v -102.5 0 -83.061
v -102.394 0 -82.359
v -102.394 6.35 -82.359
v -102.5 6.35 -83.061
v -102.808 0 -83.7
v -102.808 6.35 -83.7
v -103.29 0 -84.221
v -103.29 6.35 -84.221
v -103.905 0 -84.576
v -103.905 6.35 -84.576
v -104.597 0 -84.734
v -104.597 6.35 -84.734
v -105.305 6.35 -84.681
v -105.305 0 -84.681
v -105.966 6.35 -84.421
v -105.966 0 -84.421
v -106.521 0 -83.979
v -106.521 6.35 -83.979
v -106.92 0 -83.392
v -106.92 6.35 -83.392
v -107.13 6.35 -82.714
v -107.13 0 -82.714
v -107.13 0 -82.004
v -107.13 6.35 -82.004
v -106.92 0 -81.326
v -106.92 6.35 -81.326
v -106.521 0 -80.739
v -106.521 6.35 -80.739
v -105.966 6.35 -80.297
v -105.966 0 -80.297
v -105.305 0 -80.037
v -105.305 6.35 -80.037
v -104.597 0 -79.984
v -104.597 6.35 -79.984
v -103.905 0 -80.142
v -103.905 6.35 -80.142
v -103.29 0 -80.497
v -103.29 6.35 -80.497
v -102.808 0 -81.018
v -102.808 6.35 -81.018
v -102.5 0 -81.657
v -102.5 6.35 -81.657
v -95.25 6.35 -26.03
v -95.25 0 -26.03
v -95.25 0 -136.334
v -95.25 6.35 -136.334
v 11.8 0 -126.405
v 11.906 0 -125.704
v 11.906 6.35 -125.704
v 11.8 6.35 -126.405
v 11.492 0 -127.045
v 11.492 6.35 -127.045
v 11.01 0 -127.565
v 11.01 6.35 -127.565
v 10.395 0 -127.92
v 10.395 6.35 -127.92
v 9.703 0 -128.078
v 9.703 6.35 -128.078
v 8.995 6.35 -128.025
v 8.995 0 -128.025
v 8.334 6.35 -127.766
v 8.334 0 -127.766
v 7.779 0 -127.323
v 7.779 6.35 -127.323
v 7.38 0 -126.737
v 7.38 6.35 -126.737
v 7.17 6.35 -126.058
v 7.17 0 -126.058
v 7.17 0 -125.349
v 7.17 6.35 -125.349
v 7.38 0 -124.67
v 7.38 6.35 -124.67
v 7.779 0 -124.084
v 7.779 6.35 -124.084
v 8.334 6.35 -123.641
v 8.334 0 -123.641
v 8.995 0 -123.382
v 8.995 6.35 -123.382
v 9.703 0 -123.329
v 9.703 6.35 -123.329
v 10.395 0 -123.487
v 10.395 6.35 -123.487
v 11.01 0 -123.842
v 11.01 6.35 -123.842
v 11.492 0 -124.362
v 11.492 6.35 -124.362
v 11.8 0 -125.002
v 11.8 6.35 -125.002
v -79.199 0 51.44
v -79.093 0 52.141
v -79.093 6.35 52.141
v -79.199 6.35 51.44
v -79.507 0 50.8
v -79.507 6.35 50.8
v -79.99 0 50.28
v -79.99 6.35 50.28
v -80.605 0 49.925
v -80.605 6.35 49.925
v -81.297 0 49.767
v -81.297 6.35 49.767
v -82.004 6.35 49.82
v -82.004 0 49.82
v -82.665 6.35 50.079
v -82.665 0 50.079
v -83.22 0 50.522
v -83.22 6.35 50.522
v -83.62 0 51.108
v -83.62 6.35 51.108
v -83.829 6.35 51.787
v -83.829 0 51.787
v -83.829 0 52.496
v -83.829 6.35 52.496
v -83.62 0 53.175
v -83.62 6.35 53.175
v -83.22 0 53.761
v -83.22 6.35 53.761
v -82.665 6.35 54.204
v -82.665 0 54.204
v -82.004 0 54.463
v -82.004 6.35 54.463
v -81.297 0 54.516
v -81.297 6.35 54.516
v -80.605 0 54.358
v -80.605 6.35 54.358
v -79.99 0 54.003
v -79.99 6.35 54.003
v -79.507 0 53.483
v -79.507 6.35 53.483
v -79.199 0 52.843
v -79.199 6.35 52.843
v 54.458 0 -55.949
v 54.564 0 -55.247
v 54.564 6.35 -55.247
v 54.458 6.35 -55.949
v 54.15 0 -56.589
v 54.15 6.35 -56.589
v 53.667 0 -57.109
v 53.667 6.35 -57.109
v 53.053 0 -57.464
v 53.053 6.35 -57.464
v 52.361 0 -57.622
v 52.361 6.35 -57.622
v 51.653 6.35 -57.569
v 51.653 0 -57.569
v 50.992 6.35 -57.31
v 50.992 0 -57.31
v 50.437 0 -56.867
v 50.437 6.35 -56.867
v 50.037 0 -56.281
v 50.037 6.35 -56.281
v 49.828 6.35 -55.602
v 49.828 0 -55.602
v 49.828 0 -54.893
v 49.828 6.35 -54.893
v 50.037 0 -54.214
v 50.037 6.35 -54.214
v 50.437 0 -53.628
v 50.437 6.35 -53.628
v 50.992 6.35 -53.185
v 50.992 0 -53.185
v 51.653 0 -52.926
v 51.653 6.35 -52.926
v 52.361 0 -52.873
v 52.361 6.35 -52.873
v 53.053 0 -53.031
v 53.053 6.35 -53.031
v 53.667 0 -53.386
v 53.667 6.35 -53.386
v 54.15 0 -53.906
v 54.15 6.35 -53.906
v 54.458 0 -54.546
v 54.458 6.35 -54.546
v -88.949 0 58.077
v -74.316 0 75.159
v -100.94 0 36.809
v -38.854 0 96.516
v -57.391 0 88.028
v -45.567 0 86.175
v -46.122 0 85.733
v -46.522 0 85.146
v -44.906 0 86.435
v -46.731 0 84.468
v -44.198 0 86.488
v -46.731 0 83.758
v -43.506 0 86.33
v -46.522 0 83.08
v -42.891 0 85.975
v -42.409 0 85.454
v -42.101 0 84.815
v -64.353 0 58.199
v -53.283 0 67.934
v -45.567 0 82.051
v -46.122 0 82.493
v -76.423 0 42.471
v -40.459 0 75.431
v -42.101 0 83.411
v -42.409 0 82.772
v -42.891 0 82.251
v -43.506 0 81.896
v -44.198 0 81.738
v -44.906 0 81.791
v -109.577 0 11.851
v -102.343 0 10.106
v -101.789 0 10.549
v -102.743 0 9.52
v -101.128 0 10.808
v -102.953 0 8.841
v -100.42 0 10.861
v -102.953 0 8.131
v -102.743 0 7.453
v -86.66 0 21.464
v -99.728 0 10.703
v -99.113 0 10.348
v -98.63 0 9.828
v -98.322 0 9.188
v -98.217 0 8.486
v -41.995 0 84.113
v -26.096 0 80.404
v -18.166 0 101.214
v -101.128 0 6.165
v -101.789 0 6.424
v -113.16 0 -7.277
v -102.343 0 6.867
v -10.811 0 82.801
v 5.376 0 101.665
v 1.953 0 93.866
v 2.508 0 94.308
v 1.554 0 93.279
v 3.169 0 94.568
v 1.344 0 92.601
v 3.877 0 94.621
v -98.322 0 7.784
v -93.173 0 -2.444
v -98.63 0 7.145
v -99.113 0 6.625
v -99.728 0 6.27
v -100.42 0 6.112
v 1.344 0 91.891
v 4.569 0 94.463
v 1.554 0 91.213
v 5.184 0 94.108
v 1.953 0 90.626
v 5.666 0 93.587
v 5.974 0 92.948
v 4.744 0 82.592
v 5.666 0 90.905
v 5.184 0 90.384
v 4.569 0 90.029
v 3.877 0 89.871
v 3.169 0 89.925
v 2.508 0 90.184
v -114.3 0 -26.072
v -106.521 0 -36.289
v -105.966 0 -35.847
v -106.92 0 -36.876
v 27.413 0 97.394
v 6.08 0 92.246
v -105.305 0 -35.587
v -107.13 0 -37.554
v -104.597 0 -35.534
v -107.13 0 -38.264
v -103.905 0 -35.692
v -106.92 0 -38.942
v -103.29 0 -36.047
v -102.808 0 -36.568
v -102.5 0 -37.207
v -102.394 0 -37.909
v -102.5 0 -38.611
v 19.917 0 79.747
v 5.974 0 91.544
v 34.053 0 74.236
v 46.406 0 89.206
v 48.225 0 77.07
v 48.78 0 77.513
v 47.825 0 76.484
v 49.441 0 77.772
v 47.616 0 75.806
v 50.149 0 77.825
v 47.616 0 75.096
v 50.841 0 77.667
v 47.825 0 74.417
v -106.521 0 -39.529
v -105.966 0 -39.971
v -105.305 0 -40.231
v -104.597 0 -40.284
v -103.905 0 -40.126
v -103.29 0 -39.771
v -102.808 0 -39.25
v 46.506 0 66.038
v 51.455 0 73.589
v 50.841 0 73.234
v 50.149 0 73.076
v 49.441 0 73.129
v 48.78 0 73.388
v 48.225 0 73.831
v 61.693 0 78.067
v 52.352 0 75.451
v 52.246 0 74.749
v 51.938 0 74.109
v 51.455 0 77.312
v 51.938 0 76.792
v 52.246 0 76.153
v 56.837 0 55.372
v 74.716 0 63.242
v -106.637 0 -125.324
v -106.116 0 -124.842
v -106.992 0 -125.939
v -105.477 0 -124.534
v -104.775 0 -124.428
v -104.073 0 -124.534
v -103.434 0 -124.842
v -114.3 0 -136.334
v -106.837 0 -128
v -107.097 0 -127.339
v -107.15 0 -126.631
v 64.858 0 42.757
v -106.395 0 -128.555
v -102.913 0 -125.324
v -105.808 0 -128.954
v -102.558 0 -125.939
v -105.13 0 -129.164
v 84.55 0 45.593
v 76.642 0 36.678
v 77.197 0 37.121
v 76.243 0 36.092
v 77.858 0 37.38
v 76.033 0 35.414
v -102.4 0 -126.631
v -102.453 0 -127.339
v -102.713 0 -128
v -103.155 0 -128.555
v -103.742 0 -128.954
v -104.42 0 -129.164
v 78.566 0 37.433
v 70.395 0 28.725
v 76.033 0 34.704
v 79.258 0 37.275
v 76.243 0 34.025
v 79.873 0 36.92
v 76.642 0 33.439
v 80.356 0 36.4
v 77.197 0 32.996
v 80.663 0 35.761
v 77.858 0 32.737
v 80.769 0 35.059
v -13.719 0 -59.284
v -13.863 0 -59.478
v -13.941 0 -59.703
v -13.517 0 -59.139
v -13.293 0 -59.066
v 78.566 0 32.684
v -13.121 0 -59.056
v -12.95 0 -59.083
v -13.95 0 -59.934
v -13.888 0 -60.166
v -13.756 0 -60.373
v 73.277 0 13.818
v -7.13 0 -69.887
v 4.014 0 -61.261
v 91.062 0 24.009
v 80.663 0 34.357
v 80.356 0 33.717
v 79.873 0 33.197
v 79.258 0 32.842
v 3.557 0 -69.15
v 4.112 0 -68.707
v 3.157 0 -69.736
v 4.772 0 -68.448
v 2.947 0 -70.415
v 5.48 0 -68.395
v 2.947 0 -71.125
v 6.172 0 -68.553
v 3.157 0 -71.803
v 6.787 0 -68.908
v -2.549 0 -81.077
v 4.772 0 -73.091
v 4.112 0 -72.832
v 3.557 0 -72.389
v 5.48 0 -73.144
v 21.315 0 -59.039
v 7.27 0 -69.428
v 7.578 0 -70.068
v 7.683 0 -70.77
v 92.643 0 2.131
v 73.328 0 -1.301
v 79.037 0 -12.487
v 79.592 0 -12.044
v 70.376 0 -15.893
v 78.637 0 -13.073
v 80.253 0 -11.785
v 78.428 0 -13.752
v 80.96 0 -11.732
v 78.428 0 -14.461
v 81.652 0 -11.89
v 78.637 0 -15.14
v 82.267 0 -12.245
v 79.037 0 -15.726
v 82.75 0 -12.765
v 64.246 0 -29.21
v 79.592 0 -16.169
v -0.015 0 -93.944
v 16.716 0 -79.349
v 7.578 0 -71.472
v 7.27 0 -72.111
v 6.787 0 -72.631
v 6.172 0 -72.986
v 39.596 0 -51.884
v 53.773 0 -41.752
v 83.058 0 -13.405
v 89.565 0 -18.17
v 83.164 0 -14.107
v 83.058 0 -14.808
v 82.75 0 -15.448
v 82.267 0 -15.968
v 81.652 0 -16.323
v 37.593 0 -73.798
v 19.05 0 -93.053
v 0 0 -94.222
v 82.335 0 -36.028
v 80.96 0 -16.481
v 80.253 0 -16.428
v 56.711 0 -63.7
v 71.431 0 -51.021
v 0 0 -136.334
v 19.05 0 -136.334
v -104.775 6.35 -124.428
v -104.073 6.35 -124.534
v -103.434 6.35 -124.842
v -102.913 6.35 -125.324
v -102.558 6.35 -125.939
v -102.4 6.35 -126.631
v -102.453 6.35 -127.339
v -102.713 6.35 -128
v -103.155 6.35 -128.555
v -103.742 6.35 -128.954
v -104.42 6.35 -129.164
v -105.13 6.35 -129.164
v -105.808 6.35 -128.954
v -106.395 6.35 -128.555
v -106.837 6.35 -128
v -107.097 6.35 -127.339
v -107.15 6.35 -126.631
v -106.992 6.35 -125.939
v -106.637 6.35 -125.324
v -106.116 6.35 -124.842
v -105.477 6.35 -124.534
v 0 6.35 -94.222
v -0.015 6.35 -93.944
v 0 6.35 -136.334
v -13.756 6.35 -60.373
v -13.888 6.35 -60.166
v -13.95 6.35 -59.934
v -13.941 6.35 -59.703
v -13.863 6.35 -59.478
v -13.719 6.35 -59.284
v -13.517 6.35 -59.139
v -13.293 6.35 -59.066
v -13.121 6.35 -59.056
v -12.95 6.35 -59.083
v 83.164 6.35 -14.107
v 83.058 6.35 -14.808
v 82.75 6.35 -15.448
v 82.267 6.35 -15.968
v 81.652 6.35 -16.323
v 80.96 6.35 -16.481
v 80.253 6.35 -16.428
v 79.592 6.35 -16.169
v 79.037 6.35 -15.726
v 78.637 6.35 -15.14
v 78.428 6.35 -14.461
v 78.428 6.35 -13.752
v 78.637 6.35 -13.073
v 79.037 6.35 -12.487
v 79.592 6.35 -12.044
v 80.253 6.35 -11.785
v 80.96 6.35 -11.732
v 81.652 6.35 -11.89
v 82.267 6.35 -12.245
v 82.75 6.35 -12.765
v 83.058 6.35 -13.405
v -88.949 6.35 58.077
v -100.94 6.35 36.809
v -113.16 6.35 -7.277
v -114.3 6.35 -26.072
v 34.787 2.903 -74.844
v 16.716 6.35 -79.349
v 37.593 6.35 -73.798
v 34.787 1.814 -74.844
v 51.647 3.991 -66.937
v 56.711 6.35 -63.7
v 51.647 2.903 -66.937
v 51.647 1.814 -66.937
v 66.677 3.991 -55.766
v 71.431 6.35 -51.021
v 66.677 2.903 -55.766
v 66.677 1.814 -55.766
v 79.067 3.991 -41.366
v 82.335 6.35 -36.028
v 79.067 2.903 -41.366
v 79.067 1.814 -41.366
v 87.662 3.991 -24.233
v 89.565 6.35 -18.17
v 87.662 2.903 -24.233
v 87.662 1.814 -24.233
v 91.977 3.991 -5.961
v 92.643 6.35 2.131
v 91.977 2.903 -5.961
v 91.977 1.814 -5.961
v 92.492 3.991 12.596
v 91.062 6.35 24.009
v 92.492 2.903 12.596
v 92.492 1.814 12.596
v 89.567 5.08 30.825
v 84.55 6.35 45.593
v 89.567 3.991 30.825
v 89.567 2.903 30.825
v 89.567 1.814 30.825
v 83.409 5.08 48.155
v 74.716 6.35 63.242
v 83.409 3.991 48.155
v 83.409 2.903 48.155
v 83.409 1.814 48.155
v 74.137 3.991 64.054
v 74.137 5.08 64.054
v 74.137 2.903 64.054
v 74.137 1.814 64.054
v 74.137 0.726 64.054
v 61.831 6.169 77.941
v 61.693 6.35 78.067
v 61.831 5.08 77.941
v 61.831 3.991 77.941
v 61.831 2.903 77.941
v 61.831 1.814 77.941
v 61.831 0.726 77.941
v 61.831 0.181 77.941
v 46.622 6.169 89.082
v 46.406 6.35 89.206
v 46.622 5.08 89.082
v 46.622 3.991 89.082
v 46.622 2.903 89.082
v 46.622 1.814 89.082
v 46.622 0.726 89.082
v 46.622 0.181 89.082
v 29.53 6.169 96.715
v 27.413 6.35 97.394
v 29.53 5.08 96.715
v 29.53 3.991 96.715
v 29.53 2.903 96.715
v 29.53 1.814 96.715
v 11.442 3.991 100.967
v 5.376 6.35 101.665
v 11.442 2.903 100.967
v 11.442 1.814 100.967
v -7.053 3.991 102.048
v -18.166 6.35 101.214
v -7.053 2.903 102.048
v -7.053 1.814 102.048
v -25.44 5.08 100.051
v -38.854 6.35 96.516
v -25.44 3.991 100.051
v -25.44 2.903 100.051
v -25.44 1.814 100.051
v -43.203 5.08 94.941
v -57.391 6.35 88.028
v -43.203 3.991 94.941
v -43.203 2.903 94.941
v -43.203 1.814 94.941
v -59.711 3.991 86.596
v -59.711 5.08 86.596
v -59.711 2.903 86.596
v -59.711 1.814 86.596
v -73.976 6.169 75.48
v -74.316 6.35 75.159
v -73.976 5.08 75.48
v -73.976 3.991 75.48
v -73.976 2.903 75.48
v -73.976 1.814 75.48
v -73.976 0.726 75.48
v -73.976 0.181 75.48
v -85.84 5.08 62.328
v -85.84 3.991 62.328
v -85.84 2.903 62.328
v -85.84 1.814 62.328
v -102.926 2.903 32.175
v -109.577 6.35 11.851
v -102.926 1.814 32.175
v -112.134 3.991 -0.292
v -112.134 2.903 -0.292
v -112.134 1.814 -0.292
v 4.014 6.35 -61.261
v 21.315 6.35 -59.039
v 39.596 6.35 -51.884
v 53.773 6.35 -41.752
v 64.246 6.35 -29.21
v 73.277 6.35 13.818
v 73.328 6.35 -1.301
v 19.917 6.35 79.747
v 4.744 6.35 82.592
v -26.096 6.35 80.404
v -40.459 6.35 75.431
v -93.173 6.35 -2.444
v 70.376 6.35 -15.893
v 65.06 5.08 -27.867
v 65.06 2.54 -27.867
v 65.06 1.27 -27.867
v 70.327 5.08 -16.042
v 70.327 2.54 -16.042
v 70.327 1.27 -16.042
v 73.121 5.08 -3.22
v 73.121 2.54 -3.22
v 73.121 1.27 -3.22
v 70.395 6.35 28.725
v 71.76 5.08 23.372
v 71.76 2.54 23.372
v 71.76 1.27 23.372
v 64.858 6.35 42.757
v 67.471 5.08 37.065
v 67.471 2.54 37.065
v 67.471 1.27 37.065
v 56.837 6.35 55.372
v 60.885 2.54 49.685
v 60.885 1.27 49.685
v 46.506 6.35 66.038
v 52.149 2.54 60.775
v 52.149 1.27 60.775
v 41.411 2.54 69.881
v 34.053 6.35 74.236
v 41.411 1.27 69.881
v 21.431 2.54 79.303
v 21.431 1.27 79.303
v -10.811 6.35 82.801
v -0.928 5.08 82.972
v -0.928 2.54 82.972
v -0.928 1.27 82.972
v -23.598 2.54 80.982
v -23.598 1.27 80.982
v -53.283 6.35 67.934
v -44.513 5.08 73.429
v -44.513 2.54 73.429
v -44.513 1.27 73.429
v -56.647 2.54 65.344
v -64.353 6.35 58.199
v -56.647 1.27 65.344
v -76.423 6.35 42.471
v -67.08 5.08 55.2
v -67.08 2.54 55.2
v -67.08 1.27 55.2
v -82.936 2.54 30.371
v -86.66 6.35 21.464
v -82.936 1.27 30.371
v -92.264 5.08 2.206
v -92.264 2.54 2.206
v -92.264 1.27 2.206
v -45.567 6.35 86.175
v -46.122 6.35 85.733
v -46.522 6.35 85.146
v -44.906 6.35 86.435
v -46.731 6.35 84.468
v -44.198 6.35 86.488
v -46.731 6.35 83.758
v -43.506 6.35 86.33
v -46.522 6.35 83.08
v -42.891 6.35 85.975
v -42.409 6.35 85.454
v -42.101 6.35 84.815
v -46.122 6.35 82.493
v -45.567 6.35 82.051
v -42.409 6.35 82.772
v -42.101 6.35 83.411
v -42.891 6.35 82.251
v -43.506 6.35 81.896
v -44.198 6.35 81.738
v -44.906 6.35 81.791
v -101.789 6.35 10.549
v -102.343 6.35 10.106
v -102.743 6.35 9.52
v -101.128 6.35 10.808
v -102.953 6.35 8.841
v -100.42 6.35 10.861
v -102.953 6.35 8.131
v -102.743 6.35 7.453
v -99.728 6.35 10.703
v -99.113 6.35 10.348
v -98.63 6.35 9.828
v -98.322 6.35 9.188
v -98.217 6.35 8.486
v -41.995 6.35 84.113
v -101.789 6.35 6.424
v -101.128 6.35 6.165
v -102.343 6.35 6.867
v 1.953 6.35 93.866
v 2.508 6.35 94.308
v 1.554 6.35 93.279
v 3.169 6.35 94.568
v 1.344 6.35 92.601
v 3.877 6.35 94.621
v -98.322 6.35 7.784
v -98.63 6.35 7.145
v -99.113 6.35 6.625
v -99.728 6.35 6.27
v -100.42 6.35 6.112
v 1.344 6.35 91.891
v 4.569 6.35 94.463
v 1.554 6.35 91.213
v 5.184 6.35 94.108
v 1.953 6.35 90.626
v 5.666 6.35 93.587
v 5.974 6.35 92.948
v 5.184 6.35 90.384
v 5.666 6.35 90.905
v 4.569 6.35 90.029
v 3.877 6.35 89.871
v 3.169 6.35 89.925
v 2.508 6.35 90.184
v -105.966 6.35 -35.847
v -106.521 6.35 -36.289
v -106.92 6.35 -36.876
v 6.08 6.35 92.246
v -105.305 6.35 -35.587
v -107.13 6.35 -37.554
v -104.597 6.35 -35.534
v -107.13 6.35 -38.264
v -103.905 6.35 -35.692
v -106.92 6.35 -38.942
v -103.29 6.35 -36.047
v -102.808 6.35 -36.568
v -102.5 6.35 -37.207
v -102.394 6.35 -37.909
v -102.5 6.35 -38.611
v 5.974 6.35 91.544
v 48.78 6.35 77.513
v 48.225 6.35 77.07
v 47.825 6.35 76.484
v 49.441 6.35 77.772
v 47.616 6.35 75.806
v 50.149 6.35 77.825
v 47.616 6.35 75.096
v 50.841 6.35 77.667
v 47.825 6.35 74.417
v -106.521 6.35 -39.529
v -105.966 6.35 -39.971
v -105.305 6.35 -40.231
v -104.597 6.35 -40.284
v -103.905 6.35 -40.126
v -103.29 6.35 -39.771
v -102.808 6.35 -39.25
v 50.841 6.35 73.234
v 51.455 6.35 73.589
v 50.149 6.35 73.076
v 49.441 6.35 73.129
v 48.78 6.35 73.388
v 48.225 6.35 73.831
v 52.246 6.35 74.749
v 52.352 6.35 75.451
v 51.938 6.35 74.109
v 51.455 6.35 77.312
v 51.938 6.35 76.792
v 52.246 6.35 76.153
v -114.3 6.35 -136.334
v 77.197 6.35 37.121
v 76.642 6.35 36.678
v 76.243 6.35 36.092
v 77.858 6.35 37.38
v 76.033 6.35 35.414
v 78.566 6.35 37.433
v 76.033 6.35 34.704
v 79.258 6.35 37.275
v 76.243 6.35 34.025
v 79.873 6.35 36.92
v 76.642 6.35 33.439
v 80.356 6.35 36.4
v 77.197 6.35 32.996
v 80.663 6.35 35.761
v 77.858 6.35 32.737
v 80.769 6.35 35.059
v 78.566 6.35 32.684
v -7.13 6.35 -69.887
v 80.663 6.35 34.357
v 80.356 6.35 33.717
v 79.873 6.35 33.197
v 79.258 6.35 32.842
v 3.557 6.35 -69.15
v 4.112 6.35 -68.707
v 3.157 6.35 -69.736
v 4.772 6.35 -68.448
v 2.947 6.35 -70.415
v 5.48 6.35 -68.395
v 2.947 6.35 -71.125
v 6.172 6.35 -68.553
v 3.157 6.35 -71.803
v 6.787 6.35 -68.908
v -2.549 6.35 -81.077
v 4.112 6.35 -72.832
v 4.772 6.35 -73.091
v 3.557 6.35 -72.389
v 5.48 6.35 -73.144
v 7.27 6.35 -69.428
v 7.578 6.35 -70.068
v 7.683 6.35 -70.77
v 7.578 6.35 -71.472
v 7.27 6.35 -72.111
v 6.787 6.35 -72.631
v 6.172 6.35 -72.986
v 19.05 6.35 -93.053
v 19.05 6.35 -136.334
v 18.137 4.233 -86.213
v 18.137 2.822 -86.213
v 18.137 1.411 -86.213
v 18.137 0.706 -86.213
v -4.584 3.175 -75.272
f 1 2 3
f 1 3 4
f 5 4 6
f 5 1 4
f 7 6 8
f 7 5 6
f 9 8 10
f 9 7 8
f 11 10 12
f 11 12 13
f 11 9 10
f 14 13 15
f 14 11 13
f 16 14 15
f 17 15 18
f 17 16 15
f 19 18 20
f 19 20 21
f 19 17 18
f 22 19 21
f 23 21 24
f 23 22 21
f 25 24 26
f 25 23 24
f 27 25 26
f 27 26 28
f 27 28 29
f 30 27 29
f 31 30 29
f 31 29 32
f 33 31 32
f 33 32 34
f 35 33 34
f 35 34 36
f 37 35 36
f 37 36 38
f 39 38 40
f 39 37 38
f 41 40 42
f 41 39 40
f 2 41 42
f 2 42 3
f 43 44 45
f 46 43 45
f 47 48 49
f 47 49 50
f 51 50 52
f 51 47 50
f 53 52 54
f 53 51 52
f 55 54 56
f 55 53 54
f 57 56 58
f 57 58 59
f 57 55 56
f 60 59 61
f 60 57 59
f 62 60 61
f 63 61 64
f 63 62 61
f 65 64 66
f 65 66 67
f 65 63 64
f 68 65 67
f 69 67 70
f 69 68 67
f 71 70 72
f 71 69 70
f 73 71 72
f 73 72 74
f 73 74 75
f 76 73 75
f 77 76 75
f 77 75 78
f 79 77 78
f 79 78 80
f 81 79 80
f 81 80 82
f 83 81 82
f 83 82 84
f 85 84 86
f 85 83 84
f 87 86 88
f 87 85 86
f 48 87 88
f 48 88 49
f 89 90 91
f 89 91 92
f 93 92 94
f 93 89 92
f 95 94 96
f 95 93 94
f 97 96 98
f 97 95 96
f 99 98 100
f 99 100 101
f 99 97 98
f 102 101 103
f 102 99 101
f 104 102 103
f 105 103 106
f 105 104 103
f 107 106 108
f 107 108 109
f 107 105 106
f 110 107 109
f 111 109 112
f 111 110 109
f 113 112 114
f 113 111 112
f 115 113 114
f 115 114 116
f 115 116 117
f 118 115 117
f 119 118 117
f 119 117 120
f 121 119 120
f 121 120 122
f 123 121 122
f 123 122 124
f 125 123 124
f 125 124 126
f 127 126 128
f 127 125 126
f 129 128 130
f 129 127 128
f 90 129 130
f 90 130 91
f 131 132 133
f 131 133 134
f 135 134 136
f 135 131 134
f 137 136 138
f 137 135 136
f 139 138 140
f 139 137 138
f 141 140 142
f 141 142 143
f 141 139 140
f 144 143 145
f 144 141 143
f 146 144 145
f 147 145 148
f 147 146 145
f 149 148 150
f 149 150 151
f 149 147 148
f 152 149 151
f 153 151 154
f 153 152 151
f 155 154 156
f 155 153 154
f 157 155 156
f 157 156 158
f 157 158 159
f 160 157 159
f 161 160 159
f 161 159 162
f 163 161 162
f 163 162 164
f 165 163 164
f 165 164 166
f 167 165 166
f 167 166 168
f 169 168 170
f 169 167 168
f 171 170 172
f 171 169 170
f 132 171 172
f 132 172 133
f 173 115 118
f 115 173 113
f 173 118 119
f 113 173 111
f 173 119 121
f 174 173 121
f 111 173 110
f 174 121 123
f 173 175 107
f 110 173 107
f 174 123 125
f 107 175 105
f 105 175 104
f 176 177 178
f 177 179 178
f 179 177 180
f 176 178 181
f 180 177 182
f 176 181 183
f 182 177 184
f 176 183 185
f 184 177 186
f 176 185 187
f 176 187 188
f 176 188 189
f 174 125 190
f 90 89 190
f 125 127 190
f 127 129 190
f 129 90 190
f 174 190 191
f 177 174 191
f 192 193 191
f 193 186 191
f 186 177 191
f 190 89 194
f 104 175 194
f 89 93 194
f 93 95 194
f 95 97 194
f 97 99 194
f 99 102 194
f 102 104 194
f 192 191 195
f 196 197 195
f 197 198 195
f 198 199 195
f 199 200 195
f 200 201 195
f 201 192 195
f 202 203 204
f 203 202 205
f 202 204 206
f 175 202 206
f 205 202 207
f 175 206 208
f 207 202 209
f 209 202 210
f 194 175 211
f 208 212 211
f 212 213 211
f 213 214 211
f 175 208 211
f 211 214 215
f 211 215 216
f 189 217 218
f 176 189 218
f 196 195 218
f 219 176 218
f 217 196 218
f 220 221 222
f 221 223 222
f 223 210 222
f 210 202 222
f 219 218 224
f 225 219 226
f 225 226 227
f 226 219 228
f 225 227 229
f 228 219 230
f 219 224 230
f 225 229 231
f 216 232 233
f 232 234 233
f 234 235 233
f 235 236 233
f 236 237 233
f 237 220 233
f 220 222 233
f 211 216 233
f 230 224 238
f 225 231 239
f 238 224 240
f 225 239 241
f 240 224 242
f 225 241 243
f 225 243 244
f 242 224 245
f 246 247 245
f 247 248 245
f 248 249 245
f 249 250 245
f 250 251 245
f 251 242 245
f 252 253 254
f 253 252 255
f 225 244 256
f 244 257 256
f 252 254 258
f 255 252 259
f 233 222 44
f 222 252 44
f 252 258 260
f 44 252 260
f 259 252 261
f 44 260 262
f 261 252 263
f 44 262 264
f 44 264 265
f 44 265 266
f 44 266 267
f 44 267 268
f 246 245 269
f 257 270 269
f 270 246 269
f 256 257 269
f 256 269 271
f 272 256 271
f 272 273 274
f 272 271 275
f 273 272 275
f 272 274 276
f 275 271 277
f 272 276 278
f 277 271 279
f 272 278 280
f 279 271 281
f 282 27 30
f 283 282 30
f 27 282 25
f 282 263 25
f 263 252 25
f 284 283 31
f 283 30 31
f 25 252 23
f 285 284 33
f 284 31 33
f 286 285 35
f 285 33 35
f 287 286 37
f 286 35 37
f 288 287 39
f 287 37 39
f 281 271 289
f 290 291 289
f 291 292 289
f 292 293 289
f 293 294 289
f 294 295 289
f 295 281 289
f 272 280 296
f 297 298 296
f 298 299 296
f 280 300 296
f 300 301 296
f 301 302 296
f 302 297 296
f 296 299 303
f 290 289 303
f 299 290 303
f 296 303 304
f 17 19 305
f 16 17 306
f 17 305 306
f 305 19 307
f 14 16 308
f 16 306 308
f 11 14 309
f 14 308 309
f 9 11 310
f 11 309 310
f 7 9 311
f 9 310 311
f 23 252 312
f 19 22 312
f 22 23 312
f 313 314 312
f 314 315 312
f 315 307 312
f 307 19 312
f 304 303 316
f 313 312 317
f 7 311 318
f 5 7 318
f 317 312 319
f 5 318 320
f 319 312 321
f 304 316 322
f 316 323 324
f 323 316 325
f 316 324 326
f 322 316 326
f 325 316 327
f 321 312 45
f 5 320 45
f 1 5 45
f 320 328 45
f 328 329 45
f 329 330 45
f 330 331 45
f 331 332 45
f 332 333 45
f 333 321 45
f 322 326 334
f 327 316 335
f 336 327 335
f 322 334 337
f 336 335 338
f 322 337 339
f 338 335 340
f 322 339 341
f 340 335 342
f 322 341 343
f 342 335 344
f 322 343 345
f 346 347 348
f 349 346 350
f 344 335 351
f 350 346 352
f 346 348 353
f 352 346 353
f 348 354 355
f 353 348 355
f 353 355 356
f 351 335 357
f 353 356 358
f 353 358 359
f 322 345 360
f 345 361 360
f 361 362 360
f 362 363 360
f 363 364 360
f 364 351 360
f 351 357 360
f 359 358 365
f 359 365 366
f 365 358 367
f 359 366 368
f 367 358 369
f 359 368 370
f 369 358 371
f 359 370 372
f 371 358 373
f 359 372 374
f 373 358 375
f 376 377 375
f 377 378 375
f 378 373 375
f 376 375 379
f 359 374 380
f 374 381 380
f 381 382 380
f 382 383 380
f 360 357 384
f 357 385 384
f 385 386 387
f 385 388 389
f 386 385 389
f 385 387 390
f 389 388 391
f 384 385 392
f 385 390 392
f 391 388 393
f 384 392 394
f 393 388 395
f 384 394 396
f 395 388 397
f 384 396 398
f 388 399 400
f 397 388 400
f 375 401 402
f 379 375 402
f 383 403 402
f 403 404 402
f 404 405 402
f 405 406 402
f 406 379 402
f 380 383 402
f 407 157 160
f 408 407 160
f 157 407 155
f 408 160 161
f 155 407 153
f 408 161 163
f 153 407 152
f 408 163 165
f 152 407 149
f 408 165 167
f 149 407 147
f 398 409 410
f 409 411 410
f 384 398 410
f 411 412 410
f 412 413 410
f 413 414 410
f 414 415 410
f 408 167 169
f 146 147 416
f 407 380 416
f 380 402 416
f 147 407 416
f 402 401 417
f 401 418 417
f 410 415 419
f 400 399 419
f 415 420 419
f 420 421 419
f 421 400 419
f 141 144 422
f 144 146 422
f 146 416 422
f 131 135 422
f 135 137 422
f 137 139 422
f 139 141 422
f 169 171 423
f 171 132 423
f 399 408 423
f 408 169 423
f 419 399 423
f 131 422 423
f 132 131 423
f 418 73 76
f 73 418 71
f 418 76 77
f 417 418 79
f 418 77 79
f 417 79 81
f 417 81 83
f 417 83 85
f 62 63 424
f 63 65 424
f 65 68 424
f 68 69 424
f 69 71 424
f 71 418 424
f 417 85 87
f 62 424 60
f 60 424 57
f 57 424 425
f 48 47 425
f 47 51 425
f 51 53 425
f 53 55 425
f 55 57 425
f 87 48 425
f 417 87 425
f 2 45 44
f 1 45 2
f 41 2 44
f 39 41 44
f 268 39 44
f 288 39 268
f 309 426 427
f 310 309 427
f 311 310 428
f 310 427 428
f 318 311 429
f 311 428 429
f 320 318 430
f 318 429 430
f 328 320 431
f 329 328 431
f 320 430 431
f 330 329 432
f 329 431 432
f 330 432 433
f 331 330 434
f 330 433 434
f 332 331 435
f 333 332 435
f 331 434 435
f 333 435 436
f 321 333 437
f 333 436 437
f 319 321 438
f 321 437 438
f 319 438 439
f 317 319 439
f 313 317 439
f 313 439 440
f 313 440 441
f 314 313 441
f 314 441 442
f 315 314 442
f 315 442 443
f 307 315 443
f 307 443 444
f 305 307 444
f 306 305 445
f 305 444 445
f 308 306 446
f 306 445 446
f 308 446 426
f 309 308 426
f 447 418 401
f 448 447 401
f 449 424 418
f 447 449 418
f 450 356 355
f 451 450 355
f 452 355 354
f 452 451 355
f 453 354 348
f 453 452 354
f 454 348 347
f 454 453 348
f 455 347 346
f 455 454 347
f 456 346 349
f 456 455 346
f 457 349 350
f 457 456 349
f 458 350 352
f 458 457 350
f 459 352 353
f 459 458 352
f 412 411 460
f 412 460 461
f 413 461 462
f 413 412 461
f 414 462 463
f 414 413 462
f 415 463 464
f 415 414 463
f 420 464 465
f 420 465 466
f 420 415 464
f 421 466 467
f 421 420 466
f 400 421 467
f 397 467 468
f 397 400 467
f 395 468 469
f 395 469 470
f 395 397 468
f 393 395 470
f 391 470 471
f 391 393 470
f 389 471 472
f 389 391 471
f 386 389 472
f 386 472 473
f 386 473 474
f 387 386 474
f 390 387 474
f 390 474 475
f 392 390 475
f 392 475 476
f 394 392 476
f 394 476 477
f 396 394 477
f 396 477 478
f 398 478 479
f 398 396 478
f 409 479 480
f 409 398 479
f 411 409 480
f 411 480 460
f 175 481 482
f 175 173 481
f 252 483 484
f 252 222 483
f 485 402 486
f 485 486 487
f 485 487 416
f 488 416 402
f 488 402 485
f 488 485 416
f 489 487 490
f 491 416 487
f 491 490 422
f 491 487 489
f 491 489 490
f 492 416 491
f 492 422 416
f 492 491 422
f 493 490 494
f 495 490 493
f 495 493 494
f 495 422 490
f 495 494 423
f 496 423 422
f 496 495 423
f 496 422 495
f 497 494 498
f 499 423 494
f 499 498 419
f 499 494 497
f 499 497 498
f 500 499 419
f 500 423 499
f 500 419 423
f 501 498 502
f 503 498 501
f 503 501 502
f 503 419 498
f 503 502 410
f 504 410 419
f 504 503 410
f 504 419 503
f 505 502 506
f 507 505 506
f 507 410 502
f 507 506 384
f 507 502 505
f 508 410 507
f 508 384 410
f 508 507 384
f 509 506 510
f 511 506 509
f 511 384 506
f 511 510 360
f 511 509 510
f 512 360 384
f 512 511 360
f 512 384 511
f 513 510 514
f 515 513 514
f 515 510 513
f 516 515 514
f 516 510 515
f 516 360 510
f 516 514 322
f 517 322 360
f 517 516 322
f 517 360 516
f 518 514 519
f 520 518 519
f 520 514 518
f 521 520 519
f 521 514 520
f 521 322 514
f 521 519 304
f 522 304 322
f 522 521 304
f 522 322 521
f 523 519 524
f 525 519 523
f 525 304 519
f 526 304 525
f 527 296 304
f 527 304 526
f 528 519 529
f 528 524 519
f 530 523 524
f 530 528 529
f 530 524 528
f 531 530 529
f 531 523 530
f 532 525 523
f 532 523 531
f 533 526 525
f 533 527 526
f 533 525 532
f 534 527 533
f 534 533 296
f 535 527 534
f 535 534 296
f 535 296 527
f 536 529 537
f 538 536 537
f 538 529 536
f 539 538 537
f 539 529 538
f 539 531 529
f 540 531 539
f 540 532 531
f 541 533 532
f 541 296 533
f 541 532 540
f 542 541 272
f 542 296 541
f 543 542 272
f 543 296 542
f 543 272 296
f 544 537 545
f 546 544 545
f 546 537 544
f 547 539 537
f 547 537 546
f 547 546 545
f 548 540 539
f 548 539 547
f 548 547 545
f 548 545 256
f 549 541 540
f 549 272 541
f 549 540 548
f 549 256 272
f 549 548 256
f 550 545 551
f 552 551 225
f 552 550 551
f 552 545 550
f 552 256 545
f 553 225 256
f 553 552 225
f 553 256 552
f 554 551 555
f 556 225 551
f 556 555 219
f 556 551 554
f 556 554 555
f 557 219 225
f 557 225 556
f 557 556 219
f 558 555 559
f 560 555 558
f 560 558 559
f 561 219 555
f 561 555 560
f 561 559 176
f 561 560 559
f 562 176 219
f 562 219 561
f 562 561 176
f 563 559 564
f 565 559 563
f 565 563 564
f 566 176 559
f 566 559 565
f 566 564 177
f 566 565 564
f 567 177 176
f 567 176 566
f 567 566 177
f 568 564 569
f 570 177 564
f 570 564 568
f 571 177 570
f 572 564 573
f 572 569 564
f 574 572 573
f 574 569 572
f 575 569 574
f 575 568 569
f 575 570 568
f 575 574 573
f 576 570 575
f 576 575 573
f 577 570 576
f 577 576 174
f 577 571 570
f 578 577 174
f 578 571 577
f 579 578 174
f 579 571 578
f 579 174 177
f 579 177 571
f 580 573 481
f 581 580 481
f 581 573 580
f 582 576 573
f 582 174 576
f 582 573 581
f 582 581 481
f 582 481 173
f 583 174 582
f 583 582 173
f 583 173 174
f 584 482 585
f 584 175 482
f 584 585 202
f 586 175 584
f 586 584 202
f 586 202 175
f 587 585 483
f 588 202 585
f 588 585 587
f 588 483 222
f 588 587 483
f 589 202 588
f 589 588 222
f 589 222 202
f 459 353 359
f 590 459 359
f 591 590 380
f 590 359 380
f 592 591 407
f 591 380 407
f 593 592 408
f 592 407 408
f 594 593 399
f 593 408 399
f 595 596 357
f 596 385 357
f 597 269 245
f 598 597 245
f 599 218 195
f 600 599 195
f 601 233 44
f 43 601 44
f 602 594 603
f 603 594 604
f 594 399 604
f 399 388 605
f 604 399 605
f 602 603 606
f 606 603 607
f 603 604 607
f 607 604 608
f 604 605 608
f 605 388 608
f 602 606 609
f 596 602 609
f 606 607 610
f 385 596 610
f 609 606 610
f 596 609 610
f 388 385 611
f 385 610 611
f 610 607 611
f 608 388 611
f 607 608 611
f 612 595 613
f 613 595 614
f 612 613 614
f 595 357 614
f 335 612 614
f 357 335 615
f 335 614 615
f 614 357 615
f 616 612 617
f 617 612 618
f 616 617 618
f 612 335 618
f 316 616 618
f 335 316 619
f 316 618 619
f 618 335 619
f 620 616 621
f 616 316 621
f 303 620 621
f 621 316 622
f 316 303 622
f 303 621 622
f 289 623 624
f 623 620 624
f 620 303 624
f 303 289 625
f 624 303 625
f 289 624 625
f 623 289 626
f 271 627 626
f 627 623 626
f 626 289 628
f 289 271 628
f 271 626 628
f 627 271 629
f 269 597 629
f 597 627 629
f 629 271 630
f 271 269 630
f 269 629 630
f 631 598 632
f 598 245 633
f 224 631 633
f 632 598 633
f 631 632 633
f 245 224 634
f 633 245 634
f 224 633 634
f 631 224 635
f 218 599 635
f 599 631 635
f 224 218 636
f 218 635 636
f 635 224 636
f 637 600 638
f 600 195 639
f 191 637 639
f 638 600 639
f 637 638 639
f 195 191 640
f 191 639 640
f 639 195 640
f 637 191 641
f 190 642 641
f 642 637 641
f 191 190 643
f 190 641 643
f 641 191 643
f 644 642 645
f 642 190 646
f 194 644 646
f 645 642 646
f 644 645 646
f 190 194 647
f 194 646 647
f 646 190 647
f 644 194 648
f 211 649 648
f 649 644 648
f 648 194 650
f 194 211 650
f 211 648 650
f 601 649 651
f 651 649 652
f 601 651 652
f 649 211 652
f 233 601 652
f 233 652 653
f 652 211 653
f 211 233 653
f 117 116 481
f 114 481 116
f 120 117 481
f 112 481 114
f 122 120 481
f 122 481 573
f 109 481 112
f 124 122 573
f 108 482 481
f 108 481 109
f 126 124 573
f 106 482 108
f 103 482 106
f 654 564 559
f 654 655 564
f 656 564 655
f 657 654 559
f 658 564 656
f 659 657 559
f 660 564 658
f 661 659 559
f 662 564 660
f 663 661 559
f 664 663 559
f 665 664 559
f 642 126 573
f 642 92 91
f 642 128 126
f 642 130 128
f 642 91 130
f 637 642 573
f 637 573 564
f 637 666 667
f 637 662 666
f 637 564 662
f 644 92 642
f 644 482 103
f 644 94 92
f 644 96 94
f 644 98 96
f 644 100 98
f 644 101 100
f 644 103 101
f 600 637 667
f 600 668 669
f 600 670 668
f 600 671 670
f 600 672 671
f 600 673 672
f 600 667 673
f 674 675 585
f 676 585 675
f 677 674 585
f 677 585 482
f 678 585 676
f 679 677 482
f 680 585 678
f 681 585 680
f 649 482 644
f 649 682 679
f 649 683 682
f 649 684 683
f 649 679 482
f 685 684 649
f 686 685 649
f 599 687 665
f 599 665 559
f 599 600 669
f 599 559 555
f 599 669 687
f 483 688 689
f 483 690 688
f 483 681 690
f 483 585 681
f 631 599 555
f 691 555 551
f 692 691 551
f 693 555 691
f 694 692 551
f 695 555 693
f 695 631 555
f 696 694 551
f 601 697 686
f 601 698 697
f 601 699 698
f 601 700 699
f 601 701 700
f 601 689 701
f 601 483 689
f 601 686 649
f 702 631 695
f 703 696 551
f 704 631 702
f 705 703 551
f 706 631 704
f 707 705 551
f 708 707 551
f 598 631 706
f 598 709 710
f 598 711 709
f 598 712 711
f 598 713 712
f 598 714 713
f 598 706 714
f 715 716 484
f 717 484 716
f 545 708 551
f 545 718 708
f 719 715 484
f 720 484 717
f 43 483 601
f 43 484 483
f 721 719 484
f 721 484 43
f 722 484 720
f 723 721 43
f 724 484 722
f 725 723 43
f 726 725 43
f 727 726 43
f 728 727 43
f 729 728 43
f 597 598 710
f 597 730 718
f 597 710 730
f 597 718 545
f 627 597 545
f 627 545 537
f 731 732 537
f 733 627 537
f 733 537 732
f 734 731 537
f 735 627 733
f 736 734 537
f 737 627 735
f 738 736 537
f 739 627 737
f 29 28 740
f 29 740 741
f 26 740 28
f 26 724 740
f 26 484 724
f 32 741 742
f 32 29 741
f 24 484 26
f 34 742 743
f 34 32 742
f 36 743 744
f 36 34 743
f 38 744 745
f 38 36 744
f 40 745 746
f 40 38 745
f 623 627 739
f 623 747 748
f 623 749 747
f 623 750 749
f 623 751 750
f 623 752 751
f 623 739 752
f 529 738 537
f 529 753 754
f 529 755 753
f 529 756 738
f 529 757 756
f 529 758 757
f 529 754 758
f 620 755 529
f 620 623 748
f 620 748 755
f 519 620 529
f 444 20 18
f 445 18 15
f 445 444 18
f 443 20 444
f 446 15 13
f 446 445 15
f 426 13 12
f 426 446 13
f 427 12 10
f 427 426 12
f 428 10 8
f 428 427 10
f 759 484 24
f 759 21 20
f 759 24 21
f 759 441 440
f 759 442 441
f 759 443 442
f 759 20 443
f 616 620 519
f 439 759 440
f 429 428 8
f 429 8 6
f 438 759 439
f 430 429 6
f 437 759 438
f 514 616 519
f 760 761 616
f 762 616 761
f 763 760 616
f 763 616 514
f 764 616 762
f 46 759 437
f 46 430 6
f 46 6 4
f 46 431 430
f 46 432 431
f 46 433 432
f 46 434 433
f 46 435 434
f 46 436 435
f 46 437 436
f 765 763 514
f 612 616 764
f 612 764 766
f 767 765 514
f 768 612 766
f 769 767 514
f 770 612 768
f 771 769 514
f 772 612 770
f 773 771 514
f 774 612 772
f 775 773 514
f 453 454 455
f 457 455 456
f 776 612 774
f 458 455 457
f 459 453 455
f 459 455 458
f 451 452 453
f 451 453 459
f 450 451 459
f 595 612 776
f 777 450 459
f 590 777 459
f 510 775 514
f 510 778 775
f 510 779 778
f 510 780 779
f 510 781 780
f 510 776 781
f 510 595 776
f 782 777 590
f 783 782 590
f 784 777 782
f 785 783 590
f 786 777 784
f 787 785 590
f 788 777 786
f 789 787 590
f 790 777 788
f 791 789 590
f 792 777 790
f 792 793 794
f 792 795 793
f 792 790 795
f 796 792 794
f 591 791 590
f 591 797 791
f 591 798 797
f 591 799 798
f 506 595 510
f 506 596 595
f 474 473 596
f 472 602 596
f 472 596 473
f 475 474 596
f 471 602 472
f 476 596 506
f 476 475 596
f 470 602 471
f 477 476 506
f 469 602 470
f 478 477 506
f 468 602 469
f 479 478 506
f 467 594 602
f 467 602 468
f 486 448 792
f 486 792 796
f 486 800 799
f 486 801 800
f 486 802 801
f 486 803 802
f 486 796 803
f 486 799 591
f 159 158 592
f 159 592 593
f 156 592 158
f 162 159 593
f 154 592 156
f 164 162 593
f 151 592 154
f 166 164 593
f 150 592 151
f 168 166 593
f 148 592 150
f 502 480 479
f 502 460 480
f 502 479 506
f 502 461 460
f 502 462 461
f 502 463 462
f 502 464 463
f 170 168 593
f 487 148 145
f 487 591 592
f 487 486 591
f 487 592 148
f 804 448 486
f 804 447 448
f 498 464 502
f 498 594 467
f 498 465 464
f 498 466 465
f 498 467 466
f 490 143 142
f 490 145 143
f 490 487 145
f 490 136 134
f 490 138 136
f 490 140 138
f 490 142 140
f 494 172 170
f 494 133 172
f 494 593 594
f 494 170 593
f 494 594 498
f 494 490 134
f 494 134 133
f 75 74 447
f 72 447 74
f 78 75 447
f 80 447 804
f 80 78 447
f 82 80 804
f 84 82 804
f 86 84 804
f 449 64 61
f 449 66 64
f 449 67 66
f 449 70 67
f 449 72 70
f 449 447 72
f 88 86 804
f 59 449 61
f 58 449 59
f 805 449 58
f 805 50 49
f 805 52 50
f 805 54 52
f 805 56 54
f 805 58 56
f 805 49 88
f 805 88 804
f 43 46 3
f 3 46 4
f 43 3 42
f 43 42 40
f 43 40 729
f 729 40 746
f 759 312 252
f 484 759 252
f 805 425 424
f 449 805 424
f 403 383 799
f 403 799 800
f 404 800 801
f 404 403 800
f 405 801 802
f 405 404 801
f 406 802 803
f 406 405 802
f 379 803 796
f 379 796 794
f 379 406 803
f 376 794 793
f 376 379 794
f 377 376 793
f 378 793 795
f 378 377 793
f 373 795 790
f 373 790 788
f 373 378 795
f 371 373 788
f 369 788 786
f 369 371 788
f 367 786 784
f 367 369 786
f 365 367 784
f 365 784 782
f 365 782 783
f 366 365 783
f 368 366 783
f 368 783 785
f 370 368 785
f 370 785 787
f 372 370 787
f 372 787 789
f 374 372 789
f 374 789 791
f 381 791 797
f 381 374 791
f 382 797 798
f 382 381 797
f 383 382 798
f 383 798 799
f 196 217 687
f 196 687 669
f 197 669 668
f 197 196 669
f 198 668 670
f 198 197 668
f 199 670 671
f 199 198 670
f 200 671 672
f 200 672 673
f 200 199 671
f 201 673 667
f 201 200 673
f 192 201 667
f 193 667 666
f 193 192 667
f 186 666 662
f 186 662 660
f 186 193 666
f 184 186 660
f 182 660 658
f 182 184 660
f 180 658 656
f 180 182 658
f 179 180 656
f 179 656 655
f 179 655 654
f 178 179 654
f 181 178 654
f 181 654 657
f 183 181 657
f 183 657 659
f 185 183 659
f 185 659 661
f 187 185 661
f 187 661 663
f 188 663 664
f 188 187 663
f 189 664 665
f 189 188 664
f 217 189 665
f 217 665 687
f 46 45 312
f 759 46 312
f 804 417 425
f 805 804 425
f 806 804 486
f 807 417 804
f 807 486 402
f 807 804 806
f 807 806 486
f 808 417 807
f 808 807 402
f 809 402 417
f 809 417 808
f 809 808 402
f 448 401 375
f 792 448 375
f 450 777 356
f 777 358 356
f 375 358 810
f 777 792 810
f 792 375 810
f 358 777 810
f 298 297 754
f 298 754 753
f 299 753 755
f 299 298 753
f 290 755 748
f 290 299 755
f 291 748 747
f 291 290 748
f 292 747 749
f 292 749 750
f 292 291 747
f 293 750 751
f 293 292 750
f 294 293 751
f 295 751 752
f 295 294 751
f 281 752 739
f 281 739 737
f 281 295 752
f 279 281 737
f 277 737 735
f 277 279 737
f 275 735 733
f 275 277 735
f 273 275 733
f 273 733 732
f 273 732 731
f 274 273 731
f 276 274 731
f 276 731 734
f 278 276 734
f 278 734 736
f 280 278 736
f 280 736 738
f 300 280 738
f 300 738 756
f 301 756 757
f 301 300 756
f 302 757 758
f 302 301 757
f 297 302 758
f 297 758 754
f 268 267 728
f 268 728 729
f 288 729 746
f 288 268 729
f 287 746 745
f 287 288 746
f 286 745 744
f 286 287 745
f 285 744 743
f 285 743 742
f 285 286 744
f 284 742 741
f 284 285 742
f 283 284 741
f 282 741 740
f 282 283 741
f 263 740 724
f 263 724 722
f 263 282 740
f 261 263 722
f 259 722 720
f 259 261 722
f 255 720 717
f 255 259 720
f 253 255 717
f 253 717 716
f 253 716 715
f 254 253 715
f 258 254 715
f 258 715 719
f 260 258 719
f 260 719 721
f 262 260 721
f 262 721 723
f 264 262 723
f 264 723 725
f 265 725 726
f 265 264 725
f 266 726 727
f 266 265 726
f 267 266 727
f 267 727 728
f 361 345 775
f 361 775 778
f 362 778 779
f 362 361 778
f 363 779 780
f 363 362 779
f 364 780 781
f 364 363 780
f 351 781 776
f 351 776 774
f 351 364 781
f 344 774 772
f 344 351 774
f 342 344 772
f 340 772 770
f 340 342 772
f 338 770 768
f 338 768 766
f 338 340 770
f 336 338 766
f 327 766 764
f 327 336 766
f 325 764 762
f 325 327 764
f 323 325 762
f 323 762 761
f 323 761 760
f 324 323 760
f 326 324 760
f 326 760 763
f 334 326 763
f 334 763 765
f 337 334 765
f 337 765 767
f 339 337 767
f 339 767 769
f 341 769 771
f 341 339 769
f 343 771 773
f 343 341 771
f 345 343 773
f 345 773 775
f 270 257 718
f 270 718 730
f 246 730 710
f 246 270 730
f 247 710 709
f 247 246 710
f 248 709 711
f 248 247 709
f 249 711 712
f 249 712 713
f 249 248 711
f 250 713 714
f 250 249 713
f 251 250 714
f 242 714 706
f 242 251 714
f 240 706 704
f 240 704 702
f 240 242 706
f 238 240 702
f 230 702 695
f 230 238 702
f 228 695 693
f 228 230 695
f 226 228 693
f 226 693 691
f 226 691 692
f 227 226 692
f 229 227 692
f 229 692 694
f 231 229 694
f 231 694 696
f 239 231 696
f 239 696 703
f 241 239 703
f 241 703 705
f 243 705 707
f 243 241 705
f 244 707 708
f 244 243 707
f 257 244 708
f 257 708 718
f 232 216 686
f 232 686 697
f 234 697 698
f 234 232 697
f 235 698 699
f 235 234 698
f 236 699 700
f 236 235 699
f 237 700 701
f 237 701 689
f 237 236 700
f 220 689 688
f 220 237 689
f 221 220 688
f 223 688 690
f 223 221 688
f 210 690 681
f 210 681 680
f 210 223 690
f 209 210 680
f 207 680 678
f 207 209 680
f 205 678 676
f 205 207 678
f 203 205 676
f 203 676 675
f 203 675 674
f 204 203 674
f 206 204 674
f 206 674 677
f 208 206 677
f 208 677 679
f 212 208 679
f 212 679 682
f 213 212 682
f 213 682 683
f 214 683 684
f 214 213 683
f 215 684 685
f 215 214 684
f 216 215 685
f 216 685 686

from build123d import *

# Parameters (mm, degrees)
BOSS_EXTRUDE1_DEPTH   = 6.35
FILLET1_R             = 2.54
FILLET2_R             = 0.79375
SKETCH4_R             = 2.38125
CUT_EXTRUDE3_DEPTH    = 6.35
CRVPATTERN1_OUTLINE_R = 2.38125
CRVPATTERN1_DEPTH     = 6.35


# Read off the part's stored shape, not the designer's step: CrvPattern1
with BuildPart() as part:
    # Sketch1 → Boss-Extrude1 (new body)
    with BuildSketch(Plane(origin=(0, 0, 0), x_dir=(1, 0, 0), z_dir=(0, 1, 0))):
        with BuildLine():
            Line((0, 136.334024978), (0, 94.083801247))
            add(Edge.make_bspline(
                [(0, 94.083801247), (-2.431386336, 71.693275709), (-15.75825593, 58.230430146)],
                knots=[0, 0, 0, 1, 1, 1], degree=2))
            add(Edge.make_bspline(
                [(-15.75825593, 58.230430146), (12.928997408, 67.764135595), (70.60122301, 46.247103047), (77.540383798, -26.213493844), (40.518788725, -85.775261158), (-67.055108572, -88.304279922), (-95.415707681, -10.214485927), (-95.25, 26.030170649)],
                knots=[0, 0, 0, 0, 0.227546357, 0.356849793, 0.49581236, 0.710996888, 1, 1, 1, 1], degree=3))
            Line((-95.25, 26.030170649), (-95.25, 136.334024978))
            Line((-95.25, 136.334024978), (-114.3, 136.334024978))
            Line((-114.3, 136.334024978), (-114.3, 26.072111228))
            add(Edge.make_bspline(
                [(16.715986391, 79.348568009), (21.633097871, 78.62719896), (31.371857261, 76.389721894), (45.249200497, 70.845276961), (58.14270202, 63.202354702), (69.694268499, 53.486594004), (77.831645881, 43.678743898), (83.1663553, 34.778326042), (87.500656656, 25.500338712), (91.157064432, 13.400044888), (92.998924079, -1.463666218), (92.533158628, -16.332160856), (89.911348046, -30.922868008), (85.224669703, -44.926534482), (78.5424766, -58.087321563), (69.892966554, -70.128088223), (59.334225085, -80.722518946), (46.808294676, -89.48437896), (33.165750854, -95.831204537), (18.8220758, -100.00043745), (4.083822861, -102.101602424), (-10.777441223, -102.219799961), (-25.504851136, -100.381408636), (-37.452741503, -97.197322494), (-46.66563909, -93.622653994), (-53.378233983, -90.404269128), (-59.778019163, -86.667831837), (-67.772964247, -81.11349497), (-76.794838317, -73.191996697), (-86.082507199, -62.480245978), (-96.526865188, -46.978935087), (-104.24741081, -30.151640125), (-109.53383183, -12.800694626), (-112.324631517, 0.306051107), (-113.698273493, 11.158780223), (-114.231429958, 19.740893087), (-114.308990648, 23.9549561), (-114.3, 26.072111228)],
                knots=[0.074418032, 0.074418032, 0.074418032, 0.074418032, 0.103339233, 0.132260434, 0.161181635, 0.190102836, 0.219024037, 0.233484638, 0.247945239, 0.27686644, 0.305787641, 0.334708842, 0.363630043, 0.392551244, 0.421472445, 0.450393647, 0.479314848, 0.508236049, 0.53715725, 0.566078451, 0.594999652, 0.623920853, 0.652842055, 0.681763256, 0.696223856, 0.710684457, 0.725145057, 0.739605658, 0.768526859, 0.79744806, 0.826369261, 0.884211664, 0.913132865, 0.942054066, 0.970975267, 0.985435868, 0.999896468, 0.999896468, 0.999896468, 0.999896468], degree=3))
            add(Edge.make_bspline(
                [(19.05, 93.052513121), (19.023571763, 92.809136693), (18.983692868, 92.443089224), (18.931467162, 91.958957236), (18.862360798, 91.337915751), (18.776292871, 90.610780885), (18.625902721, 89.42512839), (18.420122868, 87.959858448), (18.049990563, 85.627575808), (17.510143571, 82.743597147), (16.996105499, 80.478464636), (16.715986391, 79.348568009)],
                knots=[-0.022894974, -0.022894974, -0.022894974, -0.022894974, -0.006590549, 0.001561663, 0.009713876, 0.0260183, 0.042322725, 0.074931575, 0.107540425, 0.172758125, 0.237975825, 0.237975825, 0.237975825, 0.237975825], degree=3))
            Line((19.05, 93.052513121), (19.05, 136.334024978))
            Line((19.05, 136.334024978), (0, 136.334024978))
        make_face()
    extrude(amount=BOSS_EXTRUDE1_DEPTH)

    # Fillet1
    fillet1_edges = [part.edges().sort_by_distance(p)[0] for p in [
        (0, 3.175, -94.083801247),
        (-95.25, 3.175, -26.030170649),
    ]]
    fillet(fillet1_edges, radius=FILLET1_R)

    # Fillet2
    fillet2_edges = [part.edges().sort_by_distance(p)[0] for p in [
        (-15.75825593, 3.175, -58.230430146),
    ]]
    fillet(fillet2_edges, radius=FILLET2_R)

    # Sketch4 → Cut-Extrude3 (cut)
    with BuildSketch(Plane(origin=(0, 6.35, 0), x_dir=(1, 0, 0), z_dir=(0, 1, 0))):
        with Locations(Location((-104.775, 126.809024978, 0), (0, 0, 270))):
            Circle(SKETCH4_R)
    extrude(amount=-CUT_EXTRUDE3_DEPTH, mode=Mode.SUBTRACT)

    # CrvPattern1 outline → CrvPattern1 (cut)
    with BuildSketch(Plane(origin=(0, 0, 0), x_dir=(1, 0, 0), z_dir=(0, 1, 0))):
        with Locations((-104.775, 82.359024978)):
            Circle(CRVPATTERN1_OUTLINE_R)
        with Locations((-104.775, 37.909024978)):
            Circle(CRVPATTERN1_OUTLINE_R)
        with Locations((-100.597903535, -8.486356178)):
            Circle(CRVPATTERN1_OUTLINE_R)
        with Locations((-81.474554, -52.141471765)):
            Circle(CRVPATTERN1_OUTLINE_R)
        with Locations((-44.376132313, -84.112983027)):
            Circle(CRVPATTERN1_OUTLINE_R)
        with Locations((3.698987105, -92.246074321)):
            Circle(CRVPATTERN1_OUTLINE_R)
        with Locations((49.97064989, -75.450636534)):
            Circle(CRVPATTERN1_OUTLINE_R)
        with Locations((78.388040736, -35.058632959)):
            Circle(CRVPATTERN1_OUTLINE_R)
        with Locations((80.782414242, 14.106535639)):
            Circle(CRVPATTERN1_OUTLINE_R)
        with Locations((52.182738061, 55.247486043)):
            Circle(CRVPATTERN1_OUTLINE_R)
        with Locations((5.302146984, 70.7696737)):
            Circle(CRVPATTERN1_OUTLINE_R)
        with Locations((9.525, 125.703541591)):
            Circle(CRVPATTERN1_OUTLINE_R)
    extrude(amount=CRVPATTERN1_DEPTH, mode=Mode.SUBTRACT)


solid = part.part
